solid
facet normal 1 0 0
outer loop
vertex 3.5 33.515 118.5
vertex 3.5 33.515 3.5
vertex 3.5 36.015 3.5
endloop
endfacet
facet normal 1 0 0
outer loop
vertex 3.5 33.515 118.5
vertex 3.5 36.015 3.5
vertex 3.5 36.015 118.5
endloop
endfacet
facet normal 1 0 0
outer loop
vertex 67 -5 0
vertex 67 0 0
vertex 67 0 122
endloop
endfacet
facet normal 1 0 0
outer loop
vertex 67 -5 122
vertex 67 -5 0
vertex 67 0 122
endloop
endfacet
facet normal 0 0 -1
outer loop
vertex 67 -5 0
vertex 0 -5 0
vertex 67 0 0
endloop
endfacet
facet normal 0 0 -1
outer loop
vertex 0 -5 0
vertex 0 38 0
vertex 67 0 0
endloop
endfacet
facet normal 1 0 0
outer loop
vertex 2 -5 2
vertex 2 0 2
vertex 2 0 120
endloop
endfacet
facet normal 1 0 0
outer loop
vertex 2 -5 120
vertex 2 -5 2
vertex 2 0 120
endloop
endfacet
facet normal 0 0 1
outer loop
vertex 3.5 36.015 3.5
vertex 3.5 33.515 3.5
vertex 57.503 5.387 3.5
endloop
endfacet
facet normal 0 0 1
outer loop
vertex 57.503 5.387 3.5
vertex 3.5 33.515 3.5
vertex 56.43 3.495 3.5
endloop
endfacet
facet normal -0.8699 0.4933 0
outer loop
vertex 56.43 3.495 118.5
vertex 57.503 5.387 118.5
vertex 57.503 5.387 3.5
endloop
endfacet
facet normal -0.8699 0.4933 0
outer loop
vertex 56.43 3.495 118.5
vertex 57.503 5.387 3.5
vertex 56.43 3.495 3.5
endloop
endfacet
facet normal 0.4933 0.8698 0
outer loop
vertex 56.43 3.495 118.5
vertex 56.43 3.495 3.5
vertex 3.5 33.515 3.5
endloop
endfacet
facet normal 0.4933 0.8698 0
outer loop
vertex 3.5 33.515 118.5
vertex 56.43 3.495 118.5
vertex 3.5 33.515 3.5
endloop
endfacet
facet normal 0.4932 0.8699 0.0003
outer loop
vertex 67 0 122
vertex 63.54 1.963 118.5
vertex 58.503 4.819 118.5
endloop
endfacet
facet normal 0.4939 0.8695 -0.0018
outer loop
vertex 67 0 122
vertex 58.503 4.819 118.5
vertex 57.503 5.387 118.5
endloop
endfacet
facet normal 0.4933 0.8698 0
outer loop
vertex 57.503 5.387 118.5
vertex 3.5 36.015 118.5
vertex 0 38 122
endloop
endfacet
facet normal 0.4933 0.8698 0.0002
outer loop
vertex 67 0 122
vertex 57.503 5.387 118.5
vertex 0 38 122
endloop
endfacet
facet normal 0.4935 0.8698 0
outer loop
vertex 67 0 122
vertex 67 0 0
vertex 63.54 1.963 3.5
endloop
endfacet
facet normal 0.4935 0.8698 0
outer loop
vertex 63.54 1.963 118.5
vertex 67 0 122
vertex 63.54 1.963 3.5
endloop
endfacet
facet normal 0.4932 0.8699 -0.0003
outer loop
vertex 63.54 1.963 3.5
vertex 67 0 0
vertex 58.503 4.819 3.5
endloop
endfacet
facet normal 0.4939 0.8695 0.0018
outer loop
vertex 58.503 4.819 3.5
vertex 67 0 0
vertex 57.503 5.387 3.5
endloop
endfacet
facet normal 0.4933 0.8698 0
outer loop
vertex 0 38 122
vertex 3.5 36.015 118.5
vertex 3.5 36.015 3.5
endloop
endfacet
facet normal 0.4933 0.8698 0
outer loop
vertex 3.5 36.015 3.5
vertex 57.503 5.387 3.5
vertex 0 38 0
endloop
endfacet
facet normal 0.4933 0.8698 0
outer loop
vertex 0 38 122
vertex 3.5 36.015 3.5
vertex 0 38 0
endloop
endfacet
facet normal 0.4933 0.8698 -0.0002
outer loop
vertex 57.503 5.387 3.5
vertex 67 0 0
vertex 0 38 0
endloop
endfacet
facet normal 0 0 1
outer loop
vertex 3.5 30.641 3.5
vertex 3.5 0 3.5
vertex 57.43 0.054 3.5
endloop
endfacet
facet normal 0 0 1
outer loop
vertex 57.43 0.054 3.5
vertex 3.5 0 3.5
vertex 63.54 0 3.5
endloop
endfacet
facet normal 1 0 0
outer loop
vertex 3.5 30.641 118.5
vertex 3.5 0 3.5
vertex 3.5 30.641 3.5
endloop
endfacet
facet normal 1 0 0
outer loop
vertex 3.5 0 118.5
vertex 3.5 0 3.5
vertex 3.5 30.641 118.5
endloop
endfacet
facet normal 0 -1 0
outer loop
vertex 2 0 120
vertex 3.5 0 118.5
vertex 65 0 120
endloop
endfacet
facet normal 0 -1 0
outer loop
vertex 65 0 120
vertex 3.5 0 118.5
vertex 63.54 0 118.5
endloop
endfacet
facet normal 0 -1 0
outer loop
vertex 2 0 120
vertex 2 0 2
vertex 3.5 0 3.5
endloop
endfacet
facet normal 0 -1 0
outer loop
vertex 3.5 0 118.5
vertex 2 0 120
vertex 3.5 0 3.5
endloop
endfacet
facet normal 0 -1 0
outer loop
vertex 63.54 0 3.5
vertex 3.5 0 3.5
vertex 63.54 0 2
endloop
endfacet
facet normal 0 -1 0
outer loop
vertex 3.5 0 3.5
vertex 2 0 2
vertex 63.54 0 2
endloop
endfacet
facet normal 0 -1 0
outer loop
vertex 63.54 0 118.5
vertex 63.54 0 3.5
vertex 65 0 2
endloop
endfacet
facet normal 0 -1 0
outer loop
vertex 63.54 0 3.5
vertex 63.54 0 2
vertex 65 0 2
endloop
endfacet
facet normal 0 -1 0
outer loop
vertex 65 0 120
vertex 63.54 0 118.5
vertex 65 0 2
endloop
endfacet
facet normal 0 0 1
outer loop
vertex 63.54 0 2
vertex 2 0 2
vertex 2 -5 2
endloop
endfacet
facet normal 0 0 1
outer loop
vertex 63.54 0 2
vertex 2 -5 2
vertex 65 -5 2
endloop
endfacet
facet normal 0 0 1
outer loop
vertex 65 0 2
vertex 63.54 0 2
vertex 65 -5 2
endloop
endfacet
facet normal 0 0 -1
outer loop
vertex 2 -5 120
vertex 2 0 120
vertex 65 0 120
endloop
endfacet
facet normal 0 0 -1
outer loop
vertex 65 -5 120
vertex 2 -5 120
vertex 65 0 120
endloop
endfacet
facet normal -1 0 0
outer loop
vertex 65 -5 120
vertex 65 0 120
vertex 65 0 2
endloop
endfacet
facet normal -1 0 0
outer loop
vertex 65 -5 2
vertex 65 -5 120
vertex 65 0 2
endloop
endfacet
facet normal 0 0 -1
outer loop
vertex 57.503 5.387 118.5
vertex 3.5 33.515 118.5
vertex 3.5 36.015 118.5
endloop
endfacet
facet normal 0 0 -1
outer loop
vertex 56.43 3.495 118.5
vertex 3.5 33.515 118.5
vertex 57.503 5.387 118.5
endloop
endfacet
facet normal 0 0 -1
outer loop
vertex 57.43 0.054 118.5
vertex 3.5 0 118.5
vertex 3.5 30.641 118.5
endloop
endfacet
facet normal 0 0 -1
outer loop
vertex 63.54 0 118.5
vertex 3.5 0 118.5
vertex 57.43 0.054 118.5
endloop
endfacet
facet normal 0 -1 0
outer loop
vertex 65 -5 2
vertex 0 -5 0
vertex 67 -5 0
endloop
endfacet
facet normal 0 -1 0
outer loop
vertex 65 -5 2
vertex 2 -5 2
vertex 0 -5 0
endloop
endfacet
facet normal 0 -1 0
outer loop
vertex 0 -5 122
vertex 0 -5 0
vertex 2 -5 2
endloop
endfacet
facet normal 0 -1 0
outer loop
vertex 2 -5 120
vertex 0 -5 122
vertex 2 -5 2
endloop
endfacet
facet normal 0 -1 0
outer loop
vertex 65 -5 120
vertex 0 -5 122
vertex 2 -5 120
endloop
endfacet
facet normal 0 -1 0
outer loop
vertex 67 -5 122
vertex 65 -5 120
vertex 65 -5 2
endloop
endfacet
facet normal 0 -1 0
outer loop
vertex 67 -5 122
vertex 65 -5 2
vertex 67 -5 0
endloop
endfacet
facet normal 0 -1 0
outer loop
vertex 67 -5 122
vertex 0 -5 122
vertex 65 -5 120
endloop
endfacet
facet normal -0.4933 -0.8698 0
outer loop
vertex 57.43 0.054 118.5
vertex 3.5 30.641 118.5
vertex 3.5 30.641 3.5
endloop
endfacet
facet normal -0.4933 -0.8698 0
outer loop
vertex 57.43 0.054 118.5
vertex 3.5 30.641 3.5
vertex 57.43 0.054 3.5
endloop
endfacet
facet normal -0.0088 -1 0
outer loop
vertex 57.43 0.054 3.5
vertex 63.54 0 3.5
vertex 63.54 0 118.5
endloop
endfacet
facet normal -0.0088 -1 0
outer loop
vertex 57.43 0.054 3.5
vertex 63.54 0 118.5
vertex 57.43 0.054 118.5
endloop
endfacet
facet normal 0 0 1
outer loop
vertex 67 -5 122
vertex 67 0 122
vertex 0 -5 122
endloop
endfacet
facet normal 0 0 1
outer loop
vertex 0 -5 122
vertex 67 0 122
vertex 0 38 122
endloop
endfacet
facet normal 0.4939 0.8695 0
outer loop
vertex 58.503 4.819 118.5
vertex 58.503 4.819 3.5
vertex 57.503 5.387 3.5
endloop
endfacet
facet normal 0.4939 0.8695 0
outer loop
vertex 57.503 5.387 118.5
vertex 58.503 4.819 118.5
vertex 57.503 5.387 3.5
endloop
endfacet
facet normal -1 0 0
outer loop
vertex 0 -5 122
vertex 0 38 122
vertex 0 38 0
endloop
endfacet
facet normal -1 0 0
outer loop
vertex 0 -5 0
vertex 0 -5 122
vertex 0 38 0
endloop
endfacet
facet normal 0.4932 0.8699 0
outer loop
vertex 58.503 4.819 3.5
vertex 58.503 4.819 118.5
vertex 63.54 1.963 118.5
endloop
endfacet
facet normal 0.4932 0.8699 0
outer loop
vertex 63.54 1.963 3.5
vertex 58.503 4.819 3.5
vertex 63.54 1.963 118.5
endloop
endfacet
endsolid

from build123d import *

# Parameters (mm, degrees)
BOSS_EXTRUDE1_DEPTH = 122
SKETCH3_W           = 60.039506293
SKETCH3_H           = 115
CUT_EXTRUDE1_DEPTH  = 122
BOSS_EXTRUDE3_DEPTH = 116.5
BOSS_EXTRUDE4_DEPTH = 116.5
BOSS_EXTRUDE5_DEPTH = 116.5
SKETCH10_W          = 63
SKETCH10_H          = 2
BOSS_EXTRUDE6_DEPTH = 5


with BuildPart() as part:
    # Sketch1 → Boss-Extrude1 (new body)
    with BuildSketch(Plane.XY):
        Polygon((0, 0), (67, 0), (0, 38), align=None)
    extrude(amount=BOSS_EXTRUDE1_DEPTH)

    # Sketch3 → Cut-Extrude1 (cut)
    with BuildSketch(Plane.XZ):
        with Locations((33.519753147, 61)):
            Rectangle(SKETCH3_W, SKETCH3_H)
    extrude(amount=-CUT_EXTRUDE1_DEPTH, mode=Mode.SUBTRACT)

    # Sketch4 → Boss-Extrude3 (add)
    with BuildSketch(Plane(origin=(0, 0, 118.5), x_dir=(-1, 0, 0), z_dir=(0, 0, -1))):
        Polygon((-3.5, 33.514925373), (-3.5, 30.640822028), (-57.429863124, 0.05373548), (-57.429863124, 2.927838825), align=None)
    extrude(amount=BOSS_EXTRUDE3_DEPTH)

    # Sketch6 → Boss-Extrude4 (add)
    with BuildSketch(Plane(origin=(0, 0, 118.5), x_dir=(-1, 0, 0), z_dir=(0, 0, -1))):
        Polygon((-57.429863124, 2.927838825), (-58.502676203, 4.819377676), (-63.539506293, 1.962668073), (-63.539506293, 0), (-57.429863124, 0.05373548), align=None)
    extrude(amount=BOSS_EXTRUDE4_DEPTH)

    # Sketch9 → Boss-Extrude5 (add)
    with BuildSketch(Plane.XY.offset(3.5)):
        Polygon((58.502676203, 4.819377676), (57.502676203, 5.386541855), (56.429863124, 3.495003005), (57.429863124, 2.927838825), align=None)
    extrude(amount=BOSS_EXTRUDE5_DEPTH)

    # Sketch10 → Boss-Extrude6 (add)
    with BuildSketch(Plane.XZ):
        Polygon((0, 122), (0, 0), (2, 0), (2, 2), (2, 120), (2, 122), align=None)
        Polygon((67, 122), (2, 122), (2, 120), (65, 120), (67, 120), align=None)
        with Locations((33.5, 1)):
            Rectangle(SKETCH10_W, SKETCH10_H)
        Polygon((65, 2), (65, 0), (67, 0), (67, 120), (65, 120), align=None)
    extrude(amount=BOSS_EXTRUDE6_DEPTH)


solid = part.part
